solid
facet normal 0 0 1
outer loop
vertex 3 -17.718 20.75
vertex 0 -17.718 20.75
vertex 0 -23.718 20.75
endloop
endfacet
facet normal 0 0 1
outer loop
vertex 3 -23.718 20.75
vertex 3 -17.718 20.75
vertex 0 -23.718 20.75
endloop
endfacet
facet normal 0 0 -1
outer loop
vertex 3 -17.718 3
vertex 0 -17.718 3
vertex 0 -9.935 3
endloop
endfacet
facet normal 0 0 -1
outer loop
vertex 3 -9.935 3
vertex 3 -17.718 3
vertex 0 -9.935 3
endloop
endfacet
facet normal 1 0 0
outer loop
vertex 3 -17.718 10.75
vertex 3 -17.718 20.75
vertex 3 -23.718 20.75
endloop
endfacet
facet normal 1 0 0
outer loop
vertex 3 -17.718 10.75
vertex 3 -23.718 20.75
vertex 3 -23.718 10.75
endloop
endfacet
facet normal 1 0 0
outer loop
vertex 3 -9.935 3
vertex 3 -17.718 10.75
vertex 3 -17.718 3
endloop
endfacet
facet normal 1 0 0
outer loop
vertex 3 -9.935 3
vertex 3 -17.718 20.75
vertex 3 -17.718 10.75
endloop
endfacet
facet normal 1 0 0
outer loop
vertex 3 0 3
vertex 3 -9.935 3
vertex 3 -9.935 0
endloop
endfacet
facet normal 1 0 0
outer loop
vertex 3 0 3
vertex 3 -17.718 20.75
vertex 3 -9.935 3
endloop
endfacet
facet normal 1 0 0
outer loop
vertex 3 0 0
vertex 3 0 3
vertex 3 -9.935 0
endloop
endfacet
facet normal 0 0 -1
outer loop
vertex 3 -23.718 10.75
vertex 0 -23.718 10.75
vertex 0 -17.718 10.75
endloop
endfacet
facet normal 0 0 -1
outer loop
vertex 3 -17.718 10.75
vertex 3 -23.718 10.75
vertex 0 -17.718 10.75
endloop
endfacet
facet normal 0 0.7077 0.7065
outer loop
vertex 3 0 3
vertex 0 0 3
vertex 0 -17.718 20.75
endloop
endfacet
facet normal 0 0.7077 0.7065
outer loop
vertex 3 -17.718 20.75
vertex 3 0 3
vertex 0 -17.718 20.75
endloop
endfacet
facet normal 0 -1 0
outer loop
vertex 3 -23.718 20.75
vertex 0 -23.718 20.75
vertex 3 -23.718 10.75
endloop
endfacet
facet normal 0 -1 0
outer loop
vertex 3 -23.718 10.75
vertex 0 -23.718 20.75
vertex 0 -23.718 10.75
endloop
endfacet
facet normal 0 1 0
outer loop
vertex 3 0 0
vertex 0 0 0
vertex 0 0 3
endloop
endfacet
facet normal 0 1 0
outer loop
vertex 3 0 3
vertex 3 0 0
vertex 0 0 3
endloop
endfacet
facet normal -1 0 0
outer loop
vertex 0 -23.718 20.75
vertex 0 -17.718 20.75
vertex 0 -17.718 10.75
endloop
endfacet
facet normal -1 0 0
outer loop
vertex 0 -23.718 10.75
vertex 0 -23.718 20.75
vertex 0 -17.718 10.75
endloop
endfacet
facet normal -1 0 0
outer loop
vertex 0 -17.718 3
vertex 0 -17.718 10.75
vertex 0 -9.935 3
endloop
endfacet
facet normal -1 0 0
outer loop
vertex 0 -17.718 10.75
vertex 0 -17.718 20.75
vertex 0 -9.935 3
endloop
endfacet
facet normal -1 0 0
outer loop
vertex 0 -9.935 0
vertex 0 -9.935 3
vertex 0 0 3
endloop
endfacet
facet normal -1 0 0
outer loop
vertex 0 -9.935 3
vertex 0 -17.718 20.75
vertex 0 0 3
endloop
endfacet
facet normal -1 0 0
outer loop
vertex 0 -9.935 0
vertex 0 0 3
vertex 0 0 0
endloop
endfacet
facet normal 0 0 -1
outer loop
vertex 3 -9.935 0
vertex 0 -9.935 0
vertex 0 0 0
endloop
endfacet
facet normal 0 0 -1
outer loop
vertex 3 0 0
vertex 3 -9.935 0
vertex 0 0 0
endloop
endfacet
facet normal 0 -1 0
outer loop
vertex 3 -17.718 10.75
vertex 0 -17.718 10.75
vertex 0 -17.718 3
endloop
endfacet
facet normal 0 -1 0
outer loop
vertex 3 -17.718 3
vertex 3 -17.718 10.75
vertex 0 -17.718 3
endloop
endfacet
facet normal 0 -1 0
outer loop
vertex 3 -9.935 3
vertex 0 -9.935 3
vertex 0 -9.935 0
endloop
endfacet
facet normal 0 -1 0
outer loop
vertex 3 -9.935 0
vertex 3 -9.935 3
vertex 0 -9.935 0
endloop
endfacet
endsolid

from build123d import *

# Parameters (mm, degrees)
BOSS_EXTRUDE1_DEPTH = 3


with BuildPart() as part:
    # Sketch1 → Boss-Extrude1 (new body)
    with BuildSketch(Plane(origin=(0, 0, 0), x_dir=(0, 0, -1), z_dir=(1, 0, 0))):
        Polygon((-3, -9.935360412), (-3, -4.967680206), (-3, 0), (-20.75, -17.717680206), (-15.75, -17.717680206), (-10.75, -17.717680206), (-3, -17.717680206), align=None)
        Polygon((-3, 0), (-3, -4.967680206), (-3, -9.935360412), (0, -9.935360412), (0, 0), align=None)
        Polygon((-15.75, -17.717680206), (-20.75, -17.717680206), (-20.75, -23.717680206), (-10.75, -23.717680206), (-10.75, -17.717680206), align=None)
    extrude(amount=BOSS_EXTRUDE1_DEPTH)


solid = part.part
